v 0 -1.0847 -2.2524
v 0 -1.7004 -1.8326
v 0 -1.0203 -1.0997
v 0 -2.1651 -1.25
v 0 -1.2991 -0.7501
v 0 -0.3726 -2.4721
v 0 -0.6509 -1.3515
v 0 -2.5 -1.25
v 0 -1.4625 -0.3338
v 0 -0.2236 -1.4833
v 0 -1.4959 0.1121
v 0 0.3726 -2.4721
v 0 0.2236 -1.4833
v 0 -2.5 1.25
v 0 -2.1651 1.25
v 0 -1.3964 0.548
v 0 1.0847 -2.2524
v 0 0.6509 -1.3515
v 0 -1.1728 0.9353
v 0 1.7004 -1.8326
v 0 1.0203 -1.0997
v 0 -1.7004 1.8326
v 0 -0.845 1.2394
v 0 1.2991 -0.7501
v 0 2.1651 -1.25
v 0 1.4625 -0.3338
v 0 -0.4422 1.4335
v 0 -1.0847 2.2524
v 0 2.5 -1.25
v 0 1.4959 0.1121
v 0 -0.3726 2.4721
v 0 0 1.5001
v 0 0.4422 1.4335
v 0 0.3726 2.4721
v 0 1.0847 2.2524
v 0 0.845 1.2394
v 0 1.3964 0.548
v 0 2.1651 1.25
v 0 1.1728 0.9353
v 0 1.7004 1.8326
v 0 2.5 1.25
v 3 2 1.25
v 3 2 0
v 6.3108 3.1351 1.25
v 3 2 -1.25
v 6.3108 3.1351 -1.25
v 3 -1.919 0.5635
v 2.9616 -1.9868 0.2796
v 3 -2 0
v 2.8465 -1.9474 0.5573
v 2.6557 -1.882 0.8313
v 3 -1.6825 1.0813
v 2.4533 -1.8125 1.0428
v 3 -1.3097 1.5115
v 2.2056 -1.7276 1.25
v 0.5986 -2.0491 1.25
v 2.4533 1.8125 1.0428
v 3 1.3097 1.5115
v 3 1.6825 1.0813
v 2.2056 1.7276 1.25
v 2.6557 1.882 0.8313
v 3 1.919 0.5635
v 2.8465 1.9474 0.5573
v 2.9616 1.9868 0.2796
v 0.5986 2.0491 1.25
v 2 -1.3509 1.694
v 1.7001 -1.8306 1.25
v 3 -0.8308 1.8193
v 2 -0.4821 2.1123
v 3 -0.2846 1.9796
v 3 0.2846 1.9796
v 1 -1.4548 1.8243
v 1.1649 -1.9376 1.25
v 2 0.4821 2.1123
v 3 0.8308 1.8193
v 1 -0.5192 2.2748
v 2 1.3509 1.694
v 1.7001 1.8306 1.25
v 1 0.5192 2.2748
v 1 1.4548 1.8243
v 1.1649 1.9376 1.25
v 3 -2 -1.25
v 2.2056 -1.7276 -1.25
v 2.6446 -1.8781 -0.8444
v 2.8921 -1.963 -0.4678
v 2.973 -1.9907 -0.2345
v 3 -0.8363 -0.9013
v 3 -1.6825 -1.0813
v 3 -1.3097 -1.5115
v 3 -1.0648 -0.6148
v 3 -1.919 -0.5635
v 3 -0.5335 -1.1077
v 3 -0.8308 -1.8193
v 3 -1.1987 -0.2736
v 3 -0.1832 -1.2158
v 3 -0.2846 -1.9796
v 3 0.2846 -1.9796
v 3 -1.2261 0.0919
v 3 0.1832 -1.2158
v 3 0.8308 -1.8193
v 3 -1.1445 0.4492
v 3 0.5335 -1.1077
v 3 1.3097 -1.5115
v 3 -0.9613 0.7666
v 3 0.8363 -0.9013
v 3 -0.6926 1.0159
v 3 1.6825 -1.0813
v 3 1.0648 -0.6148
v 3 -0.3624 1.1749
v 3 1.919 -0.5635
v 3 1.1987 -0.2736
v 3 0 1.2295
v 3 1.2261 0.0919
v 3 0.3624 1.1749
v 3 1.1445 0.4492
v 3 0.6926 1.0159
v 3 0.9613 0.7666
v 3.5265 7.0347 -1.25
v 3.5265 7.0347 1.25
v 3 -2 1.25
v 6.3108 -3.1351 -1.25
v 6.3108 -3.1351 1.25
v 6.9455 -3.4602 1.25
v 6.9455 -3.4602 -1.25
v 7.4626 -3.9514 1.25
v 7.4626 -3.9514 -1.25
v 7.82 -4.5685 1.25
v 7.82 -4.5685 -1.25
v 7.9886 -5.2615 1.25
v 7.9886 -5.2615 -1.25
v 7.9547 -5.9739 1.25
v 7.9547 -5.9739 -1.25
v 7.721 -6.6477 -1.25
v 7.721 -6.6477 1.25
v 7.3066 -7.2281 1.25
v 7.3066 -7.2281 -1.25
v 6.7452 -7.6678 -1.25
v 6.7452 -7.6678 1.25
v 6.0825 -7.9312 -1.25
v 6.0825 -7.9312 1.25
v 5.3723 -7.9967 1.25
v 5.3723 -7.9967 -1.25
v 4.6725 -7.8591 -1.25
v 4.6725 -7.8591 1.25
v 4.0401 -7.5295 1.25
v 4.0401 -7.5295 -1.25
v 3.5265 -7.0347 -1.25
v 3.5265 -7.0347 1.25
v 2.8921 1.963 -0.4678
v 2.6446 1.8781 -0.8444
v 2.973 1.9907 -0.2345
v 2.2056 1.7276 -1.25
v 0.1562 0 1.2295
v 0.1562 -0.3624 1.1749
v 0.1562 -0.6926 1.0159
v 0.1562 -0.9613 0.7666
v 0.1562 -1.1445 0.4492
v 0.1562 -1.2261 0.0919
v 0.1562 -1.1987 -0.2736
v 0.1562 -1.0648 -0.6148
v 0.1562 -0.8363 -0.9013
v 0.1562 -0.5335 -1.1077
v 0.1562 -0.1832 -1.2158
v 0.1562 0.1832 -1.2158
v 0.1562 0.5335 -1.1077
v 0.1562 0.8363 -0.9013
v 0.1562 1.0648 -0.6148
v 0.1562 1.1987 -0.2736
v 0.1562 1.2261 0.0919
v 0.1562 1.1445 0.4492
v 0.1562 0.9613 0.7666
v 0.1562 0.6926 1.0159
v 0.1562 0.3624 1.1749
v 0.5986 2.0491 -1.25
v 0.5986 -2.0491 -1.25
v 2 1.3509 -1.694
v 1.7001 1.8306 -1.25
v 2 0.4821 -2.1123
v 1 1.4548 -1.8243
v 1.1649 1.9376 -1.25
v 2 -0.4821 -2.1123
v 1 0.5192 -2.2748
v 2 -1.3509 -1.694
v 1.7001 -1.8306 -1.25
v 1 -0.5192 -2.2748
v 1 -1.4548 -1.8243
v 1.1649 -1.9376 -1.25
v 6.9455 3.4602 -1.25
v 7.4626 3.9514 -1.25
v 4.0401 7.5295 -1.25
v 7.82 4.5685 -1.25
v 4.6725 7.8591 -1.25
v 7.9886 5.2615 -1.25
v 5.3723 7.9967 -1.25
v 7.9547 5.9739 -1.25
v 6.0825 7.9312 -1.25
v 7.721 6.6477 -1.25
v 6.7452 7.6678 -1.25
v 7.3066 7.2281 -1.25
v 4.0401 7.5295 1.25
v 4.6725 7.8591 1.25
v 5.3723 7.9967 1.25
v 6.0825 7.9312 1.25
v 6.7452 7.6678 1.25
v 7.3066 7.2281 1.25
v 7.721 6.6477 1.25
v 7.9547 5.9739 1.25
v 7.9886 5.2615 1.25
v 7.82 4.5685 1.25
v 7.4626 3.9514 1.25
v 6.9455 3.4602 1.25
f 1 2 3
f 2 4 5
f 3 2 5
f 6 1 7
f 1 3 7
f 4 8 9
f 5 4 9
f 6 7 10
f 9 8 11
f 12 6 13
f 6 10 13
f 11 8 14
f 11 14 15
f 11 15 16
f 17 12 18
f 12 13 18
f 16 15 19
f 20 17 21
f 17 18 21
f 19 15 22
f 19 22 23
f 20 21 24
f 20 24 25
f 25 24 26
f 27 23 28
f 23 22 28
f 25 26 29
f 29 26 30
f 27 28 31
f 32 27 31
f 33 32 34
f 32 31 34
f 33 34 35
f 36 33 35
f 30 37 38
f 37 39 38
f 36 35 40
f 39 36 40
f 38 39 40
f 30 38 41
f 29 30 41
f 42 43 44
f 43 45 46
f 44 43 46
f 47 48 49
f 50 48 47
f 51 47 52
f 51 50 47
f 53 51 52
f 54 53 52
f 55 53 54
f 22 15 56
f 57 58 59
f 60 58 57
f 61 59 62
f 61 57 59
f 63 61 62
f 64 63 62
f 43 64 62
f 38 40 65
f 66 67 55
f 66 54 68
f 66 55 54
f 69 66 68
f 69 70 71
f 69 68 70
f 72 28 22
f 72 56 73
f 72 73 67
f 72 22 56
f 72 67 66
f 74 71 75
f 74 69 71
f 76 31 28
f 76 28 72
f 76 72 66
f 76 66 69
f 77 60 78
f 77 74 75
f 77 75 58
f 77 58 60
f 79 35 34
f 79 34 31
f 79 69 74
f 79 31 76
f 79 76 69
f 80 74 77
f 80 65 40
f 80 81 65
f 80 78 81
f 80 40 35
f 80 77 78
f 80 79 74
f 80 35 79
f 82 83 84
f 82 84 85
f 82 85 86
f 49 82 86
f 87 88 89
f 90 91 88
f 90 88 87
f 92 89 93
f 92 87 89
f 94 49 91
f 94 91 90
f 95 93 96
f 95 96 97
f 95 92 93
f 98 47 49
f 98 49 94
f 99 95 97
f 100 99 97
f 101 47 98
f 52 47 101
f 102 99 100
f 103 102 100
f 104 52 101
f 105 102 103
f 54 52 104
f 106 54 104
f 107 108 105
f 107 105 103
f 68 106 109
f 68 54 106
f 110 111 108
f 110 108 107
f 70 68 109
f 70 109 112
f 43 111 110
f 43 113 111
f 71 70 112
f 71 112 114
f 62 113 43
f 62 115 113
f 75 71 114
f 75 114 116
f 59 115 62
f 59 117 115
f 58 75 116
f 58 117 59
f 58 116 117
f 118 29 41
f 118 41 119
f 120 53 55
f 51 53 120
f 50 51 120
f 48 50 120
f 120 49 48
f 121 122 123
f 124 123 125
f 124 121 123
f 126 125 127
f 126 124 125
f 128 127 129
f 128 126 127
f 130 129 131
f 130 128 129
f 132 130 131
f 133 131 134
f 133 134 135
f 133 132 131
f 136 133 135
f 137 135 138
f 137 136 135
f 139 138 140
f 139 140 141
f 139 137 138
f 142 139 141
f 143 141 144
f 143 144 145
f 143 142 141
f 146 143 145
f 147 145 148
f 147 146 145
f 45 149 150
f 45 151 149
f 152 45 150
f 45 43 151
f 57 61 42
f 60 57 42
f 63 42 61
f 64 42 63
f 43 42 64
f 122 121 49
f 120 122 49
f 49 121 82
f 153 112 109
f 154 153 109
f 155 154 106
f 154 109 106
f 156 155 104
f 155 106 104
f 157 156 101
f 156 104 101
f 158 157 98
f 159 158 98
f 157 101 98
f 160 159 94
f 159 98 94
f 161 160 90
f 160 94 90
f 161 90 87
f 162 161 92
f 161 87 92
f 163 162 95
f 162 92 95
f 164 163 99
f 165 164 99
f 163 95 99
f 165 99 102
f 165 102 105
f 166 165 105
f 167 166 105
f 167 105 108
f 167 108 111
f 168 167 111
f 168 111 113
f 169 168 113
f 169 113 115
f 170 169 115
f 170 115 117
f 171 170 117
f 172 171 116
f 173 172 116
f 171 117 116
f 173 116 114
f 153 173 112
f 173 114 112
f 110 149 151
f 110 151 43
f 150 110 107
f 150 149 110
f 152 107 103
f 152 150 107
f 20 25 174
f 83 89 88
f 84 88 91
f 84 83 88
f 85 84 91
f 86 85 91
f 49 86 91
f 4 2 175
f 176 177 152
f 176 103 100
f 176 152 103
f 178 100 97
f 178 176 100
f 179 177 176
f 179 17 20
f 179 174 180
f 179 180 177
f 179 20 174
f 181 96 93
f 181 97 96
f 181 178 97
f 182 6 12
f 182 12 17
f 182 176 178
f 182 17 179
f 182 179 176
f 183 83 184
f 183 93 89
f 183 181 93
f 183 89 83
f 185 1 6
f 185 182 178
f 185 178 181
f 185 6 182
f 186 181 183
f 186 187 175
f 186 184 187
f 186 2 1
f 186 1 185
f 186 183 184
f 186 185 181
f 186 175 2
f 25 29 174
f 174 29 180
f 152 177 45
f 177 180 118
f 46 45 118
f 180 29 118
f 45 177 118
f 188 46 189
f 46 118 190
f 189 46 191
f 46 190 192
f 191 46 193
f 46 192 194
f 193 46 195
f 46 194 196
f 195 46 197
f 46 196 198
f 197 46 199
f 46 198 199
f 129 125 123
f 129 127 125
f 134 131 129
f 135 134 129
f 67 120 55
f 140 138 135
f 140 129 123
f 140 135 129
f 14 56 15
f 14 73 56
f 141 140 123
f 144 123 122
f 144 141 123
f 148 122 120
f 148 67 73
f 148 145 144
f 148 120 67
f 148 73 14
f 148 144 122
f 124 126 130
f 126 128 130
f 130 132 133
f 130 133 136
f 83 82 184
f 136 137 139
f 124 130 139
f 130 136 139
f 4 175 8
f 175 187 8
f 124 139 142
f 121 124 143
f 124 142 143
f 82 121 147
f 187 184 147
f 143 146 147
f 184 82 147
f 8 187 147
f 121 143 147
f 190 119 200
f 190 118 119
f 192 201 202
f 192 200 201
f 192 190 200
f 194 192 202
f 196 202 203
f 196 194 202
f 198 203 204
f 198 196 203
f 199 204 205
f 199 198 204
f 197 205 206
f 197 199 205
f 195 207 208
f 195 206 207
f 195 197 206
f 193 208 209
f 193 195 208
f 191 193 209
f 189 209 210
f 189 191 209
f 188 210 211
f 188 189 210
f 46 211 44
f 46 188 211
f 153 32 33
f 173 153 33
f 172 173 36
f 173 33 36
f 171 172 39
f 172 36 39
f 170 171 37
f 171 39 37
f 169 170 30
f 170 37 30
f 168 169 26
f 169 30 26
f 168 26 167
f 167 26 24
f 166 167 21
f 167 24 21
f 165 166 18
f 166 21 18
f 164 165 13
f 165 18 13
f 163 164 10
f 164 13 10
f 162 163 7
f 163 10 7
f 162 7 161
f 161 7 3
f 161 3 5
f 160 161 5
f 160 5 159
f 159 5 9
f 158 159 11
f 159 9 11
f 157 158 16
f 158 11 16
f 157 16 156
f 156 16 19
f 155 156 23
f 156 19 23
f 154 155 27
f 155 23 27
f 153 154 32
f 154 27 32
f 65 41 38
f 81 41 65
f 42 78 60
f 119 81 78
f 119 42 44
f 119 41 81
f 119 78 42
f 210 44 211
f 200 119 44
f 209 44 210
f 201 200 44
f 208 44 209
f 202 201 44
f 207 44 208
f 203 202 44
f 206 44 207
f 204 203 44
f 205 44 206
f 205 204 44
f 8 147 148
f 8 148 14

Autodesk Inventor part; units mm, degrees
ref_plane "YZ Plane" through (0, 0, 0) normal (1, 0, 0) x (0, 1, 0)
ref_plane "XZ Plane" through (0, 0, 0) normal (0, 1, 0) x (-1, 0, 0)
sketch "Szkic1" plane through (0, 0, 0) normal (0, 0, 1) x (1, 0, 0)
  line L0 (0, 0) -> (3, 0)
  line L1 (0, 0) -> (0, 2.5)
  line L2 (3, 2) -> (3, 0)
  line L3 (0, 2.5) -> (3.5265, 7.0347)
  line L4 (3, 2) -> (6.3108, 3.1351)
  arc A0 (6.3108, 3.1351) -> (3.5265, 7.0347) centre (5.5, 5.5) ccw
  line L5 (3, 2) -> (0, 2.5)
  line L6 (3, 2) -> (0, 0.9714)
  dimension "d0" = 4
  dimension "d1" = 5.5
  dimension "d2" = 5.5
  dimension "d3" = 2.5
  dimension "d4" = 3
  dimension "d5" = 5
revolve "Bryła" add sketch "Szkic1" angle 360 about axis through (0, 0, 0) along (1, 0, 0) contours L1 L6 L2 L0 | L1 L5 L6
extrude "Skrzydło1" add sketch "Szkic1" along normal mid plane 2.5 contours L1 L5 L6 | L5 L3 A0 L4
fillet "Zaokrąglenie1" [suppressed]
mirror "Skrzydło2" about plane through (0, 0, 0) normal (0, 1, 0) of "Skrzydło1"
sketch "Szkic2" plane through (0, 0, 0) normal (1, 0, 0) x (0, 1, 0)
  line L0 (0, -14) -> (0, 14) projected
  line L1 (-14, 0) -> (14, 0) projected
  point P0 (0, 0)
hole "Gwint" at (0, 0, 0) direction (1, 0, 0) diameter 2.459 end through all thread size "M3x0.5" class "6H" standard "ISO Metric profile"
chamfer "Faza1" distance 0.2706 angle 30 1 edges at (0, 0, -1.2295) measured on face at (0, -2.0735, 0.0494)
ref_plane "Work Plane1" through (18.5742, 0, 0) normal (0, 0, -1) x (1, 0, 0)
equation "\"d0\" = KOD2"
equation "\"d1\" = KOH1 - RR"
equation "\"d2\" = 0.5 * E0 - RR"
equation "\"d3\" = RR"
equation "\"d4\" = KOH"
equation "\"d5\" = KOD"
equation "\"d6\" = SW"
equation "\"d8\" = 0.333333 * SW"
equation "\"d9\" = -0.5 * GD1 + 0.5 * NND"
equation "\"d109\" = -0.5 * GD1 + 0.5 * NND"
equation "\"NND\" = 3"
equation "\"KOH\" = 3"
equation "\"KOH1\" = 8"
equation "\"SW\" = 2.5"
equation "\"KOD\" = 5"
equation "\"KOD2\" = 4"
equation "\"RR\" = 2.5"
equation "\"E0\" = 16"
equation "\"GUL\" = 0.541266 * PTC"
equation "\"PTC\" = 0.5"
equation "\"THREADDIA\" = 3"
equation "\"TOA\" = 30deg"
equation "\"RR2\" = 1.6"
equation "\"SW1\" = 3"
equation "\"GAL\" = 0.541266 * PTC"
equation "\"GD1\" = 2.458734"
properties part number "KS B 1014 - M 3" material "Stal, miękka"
